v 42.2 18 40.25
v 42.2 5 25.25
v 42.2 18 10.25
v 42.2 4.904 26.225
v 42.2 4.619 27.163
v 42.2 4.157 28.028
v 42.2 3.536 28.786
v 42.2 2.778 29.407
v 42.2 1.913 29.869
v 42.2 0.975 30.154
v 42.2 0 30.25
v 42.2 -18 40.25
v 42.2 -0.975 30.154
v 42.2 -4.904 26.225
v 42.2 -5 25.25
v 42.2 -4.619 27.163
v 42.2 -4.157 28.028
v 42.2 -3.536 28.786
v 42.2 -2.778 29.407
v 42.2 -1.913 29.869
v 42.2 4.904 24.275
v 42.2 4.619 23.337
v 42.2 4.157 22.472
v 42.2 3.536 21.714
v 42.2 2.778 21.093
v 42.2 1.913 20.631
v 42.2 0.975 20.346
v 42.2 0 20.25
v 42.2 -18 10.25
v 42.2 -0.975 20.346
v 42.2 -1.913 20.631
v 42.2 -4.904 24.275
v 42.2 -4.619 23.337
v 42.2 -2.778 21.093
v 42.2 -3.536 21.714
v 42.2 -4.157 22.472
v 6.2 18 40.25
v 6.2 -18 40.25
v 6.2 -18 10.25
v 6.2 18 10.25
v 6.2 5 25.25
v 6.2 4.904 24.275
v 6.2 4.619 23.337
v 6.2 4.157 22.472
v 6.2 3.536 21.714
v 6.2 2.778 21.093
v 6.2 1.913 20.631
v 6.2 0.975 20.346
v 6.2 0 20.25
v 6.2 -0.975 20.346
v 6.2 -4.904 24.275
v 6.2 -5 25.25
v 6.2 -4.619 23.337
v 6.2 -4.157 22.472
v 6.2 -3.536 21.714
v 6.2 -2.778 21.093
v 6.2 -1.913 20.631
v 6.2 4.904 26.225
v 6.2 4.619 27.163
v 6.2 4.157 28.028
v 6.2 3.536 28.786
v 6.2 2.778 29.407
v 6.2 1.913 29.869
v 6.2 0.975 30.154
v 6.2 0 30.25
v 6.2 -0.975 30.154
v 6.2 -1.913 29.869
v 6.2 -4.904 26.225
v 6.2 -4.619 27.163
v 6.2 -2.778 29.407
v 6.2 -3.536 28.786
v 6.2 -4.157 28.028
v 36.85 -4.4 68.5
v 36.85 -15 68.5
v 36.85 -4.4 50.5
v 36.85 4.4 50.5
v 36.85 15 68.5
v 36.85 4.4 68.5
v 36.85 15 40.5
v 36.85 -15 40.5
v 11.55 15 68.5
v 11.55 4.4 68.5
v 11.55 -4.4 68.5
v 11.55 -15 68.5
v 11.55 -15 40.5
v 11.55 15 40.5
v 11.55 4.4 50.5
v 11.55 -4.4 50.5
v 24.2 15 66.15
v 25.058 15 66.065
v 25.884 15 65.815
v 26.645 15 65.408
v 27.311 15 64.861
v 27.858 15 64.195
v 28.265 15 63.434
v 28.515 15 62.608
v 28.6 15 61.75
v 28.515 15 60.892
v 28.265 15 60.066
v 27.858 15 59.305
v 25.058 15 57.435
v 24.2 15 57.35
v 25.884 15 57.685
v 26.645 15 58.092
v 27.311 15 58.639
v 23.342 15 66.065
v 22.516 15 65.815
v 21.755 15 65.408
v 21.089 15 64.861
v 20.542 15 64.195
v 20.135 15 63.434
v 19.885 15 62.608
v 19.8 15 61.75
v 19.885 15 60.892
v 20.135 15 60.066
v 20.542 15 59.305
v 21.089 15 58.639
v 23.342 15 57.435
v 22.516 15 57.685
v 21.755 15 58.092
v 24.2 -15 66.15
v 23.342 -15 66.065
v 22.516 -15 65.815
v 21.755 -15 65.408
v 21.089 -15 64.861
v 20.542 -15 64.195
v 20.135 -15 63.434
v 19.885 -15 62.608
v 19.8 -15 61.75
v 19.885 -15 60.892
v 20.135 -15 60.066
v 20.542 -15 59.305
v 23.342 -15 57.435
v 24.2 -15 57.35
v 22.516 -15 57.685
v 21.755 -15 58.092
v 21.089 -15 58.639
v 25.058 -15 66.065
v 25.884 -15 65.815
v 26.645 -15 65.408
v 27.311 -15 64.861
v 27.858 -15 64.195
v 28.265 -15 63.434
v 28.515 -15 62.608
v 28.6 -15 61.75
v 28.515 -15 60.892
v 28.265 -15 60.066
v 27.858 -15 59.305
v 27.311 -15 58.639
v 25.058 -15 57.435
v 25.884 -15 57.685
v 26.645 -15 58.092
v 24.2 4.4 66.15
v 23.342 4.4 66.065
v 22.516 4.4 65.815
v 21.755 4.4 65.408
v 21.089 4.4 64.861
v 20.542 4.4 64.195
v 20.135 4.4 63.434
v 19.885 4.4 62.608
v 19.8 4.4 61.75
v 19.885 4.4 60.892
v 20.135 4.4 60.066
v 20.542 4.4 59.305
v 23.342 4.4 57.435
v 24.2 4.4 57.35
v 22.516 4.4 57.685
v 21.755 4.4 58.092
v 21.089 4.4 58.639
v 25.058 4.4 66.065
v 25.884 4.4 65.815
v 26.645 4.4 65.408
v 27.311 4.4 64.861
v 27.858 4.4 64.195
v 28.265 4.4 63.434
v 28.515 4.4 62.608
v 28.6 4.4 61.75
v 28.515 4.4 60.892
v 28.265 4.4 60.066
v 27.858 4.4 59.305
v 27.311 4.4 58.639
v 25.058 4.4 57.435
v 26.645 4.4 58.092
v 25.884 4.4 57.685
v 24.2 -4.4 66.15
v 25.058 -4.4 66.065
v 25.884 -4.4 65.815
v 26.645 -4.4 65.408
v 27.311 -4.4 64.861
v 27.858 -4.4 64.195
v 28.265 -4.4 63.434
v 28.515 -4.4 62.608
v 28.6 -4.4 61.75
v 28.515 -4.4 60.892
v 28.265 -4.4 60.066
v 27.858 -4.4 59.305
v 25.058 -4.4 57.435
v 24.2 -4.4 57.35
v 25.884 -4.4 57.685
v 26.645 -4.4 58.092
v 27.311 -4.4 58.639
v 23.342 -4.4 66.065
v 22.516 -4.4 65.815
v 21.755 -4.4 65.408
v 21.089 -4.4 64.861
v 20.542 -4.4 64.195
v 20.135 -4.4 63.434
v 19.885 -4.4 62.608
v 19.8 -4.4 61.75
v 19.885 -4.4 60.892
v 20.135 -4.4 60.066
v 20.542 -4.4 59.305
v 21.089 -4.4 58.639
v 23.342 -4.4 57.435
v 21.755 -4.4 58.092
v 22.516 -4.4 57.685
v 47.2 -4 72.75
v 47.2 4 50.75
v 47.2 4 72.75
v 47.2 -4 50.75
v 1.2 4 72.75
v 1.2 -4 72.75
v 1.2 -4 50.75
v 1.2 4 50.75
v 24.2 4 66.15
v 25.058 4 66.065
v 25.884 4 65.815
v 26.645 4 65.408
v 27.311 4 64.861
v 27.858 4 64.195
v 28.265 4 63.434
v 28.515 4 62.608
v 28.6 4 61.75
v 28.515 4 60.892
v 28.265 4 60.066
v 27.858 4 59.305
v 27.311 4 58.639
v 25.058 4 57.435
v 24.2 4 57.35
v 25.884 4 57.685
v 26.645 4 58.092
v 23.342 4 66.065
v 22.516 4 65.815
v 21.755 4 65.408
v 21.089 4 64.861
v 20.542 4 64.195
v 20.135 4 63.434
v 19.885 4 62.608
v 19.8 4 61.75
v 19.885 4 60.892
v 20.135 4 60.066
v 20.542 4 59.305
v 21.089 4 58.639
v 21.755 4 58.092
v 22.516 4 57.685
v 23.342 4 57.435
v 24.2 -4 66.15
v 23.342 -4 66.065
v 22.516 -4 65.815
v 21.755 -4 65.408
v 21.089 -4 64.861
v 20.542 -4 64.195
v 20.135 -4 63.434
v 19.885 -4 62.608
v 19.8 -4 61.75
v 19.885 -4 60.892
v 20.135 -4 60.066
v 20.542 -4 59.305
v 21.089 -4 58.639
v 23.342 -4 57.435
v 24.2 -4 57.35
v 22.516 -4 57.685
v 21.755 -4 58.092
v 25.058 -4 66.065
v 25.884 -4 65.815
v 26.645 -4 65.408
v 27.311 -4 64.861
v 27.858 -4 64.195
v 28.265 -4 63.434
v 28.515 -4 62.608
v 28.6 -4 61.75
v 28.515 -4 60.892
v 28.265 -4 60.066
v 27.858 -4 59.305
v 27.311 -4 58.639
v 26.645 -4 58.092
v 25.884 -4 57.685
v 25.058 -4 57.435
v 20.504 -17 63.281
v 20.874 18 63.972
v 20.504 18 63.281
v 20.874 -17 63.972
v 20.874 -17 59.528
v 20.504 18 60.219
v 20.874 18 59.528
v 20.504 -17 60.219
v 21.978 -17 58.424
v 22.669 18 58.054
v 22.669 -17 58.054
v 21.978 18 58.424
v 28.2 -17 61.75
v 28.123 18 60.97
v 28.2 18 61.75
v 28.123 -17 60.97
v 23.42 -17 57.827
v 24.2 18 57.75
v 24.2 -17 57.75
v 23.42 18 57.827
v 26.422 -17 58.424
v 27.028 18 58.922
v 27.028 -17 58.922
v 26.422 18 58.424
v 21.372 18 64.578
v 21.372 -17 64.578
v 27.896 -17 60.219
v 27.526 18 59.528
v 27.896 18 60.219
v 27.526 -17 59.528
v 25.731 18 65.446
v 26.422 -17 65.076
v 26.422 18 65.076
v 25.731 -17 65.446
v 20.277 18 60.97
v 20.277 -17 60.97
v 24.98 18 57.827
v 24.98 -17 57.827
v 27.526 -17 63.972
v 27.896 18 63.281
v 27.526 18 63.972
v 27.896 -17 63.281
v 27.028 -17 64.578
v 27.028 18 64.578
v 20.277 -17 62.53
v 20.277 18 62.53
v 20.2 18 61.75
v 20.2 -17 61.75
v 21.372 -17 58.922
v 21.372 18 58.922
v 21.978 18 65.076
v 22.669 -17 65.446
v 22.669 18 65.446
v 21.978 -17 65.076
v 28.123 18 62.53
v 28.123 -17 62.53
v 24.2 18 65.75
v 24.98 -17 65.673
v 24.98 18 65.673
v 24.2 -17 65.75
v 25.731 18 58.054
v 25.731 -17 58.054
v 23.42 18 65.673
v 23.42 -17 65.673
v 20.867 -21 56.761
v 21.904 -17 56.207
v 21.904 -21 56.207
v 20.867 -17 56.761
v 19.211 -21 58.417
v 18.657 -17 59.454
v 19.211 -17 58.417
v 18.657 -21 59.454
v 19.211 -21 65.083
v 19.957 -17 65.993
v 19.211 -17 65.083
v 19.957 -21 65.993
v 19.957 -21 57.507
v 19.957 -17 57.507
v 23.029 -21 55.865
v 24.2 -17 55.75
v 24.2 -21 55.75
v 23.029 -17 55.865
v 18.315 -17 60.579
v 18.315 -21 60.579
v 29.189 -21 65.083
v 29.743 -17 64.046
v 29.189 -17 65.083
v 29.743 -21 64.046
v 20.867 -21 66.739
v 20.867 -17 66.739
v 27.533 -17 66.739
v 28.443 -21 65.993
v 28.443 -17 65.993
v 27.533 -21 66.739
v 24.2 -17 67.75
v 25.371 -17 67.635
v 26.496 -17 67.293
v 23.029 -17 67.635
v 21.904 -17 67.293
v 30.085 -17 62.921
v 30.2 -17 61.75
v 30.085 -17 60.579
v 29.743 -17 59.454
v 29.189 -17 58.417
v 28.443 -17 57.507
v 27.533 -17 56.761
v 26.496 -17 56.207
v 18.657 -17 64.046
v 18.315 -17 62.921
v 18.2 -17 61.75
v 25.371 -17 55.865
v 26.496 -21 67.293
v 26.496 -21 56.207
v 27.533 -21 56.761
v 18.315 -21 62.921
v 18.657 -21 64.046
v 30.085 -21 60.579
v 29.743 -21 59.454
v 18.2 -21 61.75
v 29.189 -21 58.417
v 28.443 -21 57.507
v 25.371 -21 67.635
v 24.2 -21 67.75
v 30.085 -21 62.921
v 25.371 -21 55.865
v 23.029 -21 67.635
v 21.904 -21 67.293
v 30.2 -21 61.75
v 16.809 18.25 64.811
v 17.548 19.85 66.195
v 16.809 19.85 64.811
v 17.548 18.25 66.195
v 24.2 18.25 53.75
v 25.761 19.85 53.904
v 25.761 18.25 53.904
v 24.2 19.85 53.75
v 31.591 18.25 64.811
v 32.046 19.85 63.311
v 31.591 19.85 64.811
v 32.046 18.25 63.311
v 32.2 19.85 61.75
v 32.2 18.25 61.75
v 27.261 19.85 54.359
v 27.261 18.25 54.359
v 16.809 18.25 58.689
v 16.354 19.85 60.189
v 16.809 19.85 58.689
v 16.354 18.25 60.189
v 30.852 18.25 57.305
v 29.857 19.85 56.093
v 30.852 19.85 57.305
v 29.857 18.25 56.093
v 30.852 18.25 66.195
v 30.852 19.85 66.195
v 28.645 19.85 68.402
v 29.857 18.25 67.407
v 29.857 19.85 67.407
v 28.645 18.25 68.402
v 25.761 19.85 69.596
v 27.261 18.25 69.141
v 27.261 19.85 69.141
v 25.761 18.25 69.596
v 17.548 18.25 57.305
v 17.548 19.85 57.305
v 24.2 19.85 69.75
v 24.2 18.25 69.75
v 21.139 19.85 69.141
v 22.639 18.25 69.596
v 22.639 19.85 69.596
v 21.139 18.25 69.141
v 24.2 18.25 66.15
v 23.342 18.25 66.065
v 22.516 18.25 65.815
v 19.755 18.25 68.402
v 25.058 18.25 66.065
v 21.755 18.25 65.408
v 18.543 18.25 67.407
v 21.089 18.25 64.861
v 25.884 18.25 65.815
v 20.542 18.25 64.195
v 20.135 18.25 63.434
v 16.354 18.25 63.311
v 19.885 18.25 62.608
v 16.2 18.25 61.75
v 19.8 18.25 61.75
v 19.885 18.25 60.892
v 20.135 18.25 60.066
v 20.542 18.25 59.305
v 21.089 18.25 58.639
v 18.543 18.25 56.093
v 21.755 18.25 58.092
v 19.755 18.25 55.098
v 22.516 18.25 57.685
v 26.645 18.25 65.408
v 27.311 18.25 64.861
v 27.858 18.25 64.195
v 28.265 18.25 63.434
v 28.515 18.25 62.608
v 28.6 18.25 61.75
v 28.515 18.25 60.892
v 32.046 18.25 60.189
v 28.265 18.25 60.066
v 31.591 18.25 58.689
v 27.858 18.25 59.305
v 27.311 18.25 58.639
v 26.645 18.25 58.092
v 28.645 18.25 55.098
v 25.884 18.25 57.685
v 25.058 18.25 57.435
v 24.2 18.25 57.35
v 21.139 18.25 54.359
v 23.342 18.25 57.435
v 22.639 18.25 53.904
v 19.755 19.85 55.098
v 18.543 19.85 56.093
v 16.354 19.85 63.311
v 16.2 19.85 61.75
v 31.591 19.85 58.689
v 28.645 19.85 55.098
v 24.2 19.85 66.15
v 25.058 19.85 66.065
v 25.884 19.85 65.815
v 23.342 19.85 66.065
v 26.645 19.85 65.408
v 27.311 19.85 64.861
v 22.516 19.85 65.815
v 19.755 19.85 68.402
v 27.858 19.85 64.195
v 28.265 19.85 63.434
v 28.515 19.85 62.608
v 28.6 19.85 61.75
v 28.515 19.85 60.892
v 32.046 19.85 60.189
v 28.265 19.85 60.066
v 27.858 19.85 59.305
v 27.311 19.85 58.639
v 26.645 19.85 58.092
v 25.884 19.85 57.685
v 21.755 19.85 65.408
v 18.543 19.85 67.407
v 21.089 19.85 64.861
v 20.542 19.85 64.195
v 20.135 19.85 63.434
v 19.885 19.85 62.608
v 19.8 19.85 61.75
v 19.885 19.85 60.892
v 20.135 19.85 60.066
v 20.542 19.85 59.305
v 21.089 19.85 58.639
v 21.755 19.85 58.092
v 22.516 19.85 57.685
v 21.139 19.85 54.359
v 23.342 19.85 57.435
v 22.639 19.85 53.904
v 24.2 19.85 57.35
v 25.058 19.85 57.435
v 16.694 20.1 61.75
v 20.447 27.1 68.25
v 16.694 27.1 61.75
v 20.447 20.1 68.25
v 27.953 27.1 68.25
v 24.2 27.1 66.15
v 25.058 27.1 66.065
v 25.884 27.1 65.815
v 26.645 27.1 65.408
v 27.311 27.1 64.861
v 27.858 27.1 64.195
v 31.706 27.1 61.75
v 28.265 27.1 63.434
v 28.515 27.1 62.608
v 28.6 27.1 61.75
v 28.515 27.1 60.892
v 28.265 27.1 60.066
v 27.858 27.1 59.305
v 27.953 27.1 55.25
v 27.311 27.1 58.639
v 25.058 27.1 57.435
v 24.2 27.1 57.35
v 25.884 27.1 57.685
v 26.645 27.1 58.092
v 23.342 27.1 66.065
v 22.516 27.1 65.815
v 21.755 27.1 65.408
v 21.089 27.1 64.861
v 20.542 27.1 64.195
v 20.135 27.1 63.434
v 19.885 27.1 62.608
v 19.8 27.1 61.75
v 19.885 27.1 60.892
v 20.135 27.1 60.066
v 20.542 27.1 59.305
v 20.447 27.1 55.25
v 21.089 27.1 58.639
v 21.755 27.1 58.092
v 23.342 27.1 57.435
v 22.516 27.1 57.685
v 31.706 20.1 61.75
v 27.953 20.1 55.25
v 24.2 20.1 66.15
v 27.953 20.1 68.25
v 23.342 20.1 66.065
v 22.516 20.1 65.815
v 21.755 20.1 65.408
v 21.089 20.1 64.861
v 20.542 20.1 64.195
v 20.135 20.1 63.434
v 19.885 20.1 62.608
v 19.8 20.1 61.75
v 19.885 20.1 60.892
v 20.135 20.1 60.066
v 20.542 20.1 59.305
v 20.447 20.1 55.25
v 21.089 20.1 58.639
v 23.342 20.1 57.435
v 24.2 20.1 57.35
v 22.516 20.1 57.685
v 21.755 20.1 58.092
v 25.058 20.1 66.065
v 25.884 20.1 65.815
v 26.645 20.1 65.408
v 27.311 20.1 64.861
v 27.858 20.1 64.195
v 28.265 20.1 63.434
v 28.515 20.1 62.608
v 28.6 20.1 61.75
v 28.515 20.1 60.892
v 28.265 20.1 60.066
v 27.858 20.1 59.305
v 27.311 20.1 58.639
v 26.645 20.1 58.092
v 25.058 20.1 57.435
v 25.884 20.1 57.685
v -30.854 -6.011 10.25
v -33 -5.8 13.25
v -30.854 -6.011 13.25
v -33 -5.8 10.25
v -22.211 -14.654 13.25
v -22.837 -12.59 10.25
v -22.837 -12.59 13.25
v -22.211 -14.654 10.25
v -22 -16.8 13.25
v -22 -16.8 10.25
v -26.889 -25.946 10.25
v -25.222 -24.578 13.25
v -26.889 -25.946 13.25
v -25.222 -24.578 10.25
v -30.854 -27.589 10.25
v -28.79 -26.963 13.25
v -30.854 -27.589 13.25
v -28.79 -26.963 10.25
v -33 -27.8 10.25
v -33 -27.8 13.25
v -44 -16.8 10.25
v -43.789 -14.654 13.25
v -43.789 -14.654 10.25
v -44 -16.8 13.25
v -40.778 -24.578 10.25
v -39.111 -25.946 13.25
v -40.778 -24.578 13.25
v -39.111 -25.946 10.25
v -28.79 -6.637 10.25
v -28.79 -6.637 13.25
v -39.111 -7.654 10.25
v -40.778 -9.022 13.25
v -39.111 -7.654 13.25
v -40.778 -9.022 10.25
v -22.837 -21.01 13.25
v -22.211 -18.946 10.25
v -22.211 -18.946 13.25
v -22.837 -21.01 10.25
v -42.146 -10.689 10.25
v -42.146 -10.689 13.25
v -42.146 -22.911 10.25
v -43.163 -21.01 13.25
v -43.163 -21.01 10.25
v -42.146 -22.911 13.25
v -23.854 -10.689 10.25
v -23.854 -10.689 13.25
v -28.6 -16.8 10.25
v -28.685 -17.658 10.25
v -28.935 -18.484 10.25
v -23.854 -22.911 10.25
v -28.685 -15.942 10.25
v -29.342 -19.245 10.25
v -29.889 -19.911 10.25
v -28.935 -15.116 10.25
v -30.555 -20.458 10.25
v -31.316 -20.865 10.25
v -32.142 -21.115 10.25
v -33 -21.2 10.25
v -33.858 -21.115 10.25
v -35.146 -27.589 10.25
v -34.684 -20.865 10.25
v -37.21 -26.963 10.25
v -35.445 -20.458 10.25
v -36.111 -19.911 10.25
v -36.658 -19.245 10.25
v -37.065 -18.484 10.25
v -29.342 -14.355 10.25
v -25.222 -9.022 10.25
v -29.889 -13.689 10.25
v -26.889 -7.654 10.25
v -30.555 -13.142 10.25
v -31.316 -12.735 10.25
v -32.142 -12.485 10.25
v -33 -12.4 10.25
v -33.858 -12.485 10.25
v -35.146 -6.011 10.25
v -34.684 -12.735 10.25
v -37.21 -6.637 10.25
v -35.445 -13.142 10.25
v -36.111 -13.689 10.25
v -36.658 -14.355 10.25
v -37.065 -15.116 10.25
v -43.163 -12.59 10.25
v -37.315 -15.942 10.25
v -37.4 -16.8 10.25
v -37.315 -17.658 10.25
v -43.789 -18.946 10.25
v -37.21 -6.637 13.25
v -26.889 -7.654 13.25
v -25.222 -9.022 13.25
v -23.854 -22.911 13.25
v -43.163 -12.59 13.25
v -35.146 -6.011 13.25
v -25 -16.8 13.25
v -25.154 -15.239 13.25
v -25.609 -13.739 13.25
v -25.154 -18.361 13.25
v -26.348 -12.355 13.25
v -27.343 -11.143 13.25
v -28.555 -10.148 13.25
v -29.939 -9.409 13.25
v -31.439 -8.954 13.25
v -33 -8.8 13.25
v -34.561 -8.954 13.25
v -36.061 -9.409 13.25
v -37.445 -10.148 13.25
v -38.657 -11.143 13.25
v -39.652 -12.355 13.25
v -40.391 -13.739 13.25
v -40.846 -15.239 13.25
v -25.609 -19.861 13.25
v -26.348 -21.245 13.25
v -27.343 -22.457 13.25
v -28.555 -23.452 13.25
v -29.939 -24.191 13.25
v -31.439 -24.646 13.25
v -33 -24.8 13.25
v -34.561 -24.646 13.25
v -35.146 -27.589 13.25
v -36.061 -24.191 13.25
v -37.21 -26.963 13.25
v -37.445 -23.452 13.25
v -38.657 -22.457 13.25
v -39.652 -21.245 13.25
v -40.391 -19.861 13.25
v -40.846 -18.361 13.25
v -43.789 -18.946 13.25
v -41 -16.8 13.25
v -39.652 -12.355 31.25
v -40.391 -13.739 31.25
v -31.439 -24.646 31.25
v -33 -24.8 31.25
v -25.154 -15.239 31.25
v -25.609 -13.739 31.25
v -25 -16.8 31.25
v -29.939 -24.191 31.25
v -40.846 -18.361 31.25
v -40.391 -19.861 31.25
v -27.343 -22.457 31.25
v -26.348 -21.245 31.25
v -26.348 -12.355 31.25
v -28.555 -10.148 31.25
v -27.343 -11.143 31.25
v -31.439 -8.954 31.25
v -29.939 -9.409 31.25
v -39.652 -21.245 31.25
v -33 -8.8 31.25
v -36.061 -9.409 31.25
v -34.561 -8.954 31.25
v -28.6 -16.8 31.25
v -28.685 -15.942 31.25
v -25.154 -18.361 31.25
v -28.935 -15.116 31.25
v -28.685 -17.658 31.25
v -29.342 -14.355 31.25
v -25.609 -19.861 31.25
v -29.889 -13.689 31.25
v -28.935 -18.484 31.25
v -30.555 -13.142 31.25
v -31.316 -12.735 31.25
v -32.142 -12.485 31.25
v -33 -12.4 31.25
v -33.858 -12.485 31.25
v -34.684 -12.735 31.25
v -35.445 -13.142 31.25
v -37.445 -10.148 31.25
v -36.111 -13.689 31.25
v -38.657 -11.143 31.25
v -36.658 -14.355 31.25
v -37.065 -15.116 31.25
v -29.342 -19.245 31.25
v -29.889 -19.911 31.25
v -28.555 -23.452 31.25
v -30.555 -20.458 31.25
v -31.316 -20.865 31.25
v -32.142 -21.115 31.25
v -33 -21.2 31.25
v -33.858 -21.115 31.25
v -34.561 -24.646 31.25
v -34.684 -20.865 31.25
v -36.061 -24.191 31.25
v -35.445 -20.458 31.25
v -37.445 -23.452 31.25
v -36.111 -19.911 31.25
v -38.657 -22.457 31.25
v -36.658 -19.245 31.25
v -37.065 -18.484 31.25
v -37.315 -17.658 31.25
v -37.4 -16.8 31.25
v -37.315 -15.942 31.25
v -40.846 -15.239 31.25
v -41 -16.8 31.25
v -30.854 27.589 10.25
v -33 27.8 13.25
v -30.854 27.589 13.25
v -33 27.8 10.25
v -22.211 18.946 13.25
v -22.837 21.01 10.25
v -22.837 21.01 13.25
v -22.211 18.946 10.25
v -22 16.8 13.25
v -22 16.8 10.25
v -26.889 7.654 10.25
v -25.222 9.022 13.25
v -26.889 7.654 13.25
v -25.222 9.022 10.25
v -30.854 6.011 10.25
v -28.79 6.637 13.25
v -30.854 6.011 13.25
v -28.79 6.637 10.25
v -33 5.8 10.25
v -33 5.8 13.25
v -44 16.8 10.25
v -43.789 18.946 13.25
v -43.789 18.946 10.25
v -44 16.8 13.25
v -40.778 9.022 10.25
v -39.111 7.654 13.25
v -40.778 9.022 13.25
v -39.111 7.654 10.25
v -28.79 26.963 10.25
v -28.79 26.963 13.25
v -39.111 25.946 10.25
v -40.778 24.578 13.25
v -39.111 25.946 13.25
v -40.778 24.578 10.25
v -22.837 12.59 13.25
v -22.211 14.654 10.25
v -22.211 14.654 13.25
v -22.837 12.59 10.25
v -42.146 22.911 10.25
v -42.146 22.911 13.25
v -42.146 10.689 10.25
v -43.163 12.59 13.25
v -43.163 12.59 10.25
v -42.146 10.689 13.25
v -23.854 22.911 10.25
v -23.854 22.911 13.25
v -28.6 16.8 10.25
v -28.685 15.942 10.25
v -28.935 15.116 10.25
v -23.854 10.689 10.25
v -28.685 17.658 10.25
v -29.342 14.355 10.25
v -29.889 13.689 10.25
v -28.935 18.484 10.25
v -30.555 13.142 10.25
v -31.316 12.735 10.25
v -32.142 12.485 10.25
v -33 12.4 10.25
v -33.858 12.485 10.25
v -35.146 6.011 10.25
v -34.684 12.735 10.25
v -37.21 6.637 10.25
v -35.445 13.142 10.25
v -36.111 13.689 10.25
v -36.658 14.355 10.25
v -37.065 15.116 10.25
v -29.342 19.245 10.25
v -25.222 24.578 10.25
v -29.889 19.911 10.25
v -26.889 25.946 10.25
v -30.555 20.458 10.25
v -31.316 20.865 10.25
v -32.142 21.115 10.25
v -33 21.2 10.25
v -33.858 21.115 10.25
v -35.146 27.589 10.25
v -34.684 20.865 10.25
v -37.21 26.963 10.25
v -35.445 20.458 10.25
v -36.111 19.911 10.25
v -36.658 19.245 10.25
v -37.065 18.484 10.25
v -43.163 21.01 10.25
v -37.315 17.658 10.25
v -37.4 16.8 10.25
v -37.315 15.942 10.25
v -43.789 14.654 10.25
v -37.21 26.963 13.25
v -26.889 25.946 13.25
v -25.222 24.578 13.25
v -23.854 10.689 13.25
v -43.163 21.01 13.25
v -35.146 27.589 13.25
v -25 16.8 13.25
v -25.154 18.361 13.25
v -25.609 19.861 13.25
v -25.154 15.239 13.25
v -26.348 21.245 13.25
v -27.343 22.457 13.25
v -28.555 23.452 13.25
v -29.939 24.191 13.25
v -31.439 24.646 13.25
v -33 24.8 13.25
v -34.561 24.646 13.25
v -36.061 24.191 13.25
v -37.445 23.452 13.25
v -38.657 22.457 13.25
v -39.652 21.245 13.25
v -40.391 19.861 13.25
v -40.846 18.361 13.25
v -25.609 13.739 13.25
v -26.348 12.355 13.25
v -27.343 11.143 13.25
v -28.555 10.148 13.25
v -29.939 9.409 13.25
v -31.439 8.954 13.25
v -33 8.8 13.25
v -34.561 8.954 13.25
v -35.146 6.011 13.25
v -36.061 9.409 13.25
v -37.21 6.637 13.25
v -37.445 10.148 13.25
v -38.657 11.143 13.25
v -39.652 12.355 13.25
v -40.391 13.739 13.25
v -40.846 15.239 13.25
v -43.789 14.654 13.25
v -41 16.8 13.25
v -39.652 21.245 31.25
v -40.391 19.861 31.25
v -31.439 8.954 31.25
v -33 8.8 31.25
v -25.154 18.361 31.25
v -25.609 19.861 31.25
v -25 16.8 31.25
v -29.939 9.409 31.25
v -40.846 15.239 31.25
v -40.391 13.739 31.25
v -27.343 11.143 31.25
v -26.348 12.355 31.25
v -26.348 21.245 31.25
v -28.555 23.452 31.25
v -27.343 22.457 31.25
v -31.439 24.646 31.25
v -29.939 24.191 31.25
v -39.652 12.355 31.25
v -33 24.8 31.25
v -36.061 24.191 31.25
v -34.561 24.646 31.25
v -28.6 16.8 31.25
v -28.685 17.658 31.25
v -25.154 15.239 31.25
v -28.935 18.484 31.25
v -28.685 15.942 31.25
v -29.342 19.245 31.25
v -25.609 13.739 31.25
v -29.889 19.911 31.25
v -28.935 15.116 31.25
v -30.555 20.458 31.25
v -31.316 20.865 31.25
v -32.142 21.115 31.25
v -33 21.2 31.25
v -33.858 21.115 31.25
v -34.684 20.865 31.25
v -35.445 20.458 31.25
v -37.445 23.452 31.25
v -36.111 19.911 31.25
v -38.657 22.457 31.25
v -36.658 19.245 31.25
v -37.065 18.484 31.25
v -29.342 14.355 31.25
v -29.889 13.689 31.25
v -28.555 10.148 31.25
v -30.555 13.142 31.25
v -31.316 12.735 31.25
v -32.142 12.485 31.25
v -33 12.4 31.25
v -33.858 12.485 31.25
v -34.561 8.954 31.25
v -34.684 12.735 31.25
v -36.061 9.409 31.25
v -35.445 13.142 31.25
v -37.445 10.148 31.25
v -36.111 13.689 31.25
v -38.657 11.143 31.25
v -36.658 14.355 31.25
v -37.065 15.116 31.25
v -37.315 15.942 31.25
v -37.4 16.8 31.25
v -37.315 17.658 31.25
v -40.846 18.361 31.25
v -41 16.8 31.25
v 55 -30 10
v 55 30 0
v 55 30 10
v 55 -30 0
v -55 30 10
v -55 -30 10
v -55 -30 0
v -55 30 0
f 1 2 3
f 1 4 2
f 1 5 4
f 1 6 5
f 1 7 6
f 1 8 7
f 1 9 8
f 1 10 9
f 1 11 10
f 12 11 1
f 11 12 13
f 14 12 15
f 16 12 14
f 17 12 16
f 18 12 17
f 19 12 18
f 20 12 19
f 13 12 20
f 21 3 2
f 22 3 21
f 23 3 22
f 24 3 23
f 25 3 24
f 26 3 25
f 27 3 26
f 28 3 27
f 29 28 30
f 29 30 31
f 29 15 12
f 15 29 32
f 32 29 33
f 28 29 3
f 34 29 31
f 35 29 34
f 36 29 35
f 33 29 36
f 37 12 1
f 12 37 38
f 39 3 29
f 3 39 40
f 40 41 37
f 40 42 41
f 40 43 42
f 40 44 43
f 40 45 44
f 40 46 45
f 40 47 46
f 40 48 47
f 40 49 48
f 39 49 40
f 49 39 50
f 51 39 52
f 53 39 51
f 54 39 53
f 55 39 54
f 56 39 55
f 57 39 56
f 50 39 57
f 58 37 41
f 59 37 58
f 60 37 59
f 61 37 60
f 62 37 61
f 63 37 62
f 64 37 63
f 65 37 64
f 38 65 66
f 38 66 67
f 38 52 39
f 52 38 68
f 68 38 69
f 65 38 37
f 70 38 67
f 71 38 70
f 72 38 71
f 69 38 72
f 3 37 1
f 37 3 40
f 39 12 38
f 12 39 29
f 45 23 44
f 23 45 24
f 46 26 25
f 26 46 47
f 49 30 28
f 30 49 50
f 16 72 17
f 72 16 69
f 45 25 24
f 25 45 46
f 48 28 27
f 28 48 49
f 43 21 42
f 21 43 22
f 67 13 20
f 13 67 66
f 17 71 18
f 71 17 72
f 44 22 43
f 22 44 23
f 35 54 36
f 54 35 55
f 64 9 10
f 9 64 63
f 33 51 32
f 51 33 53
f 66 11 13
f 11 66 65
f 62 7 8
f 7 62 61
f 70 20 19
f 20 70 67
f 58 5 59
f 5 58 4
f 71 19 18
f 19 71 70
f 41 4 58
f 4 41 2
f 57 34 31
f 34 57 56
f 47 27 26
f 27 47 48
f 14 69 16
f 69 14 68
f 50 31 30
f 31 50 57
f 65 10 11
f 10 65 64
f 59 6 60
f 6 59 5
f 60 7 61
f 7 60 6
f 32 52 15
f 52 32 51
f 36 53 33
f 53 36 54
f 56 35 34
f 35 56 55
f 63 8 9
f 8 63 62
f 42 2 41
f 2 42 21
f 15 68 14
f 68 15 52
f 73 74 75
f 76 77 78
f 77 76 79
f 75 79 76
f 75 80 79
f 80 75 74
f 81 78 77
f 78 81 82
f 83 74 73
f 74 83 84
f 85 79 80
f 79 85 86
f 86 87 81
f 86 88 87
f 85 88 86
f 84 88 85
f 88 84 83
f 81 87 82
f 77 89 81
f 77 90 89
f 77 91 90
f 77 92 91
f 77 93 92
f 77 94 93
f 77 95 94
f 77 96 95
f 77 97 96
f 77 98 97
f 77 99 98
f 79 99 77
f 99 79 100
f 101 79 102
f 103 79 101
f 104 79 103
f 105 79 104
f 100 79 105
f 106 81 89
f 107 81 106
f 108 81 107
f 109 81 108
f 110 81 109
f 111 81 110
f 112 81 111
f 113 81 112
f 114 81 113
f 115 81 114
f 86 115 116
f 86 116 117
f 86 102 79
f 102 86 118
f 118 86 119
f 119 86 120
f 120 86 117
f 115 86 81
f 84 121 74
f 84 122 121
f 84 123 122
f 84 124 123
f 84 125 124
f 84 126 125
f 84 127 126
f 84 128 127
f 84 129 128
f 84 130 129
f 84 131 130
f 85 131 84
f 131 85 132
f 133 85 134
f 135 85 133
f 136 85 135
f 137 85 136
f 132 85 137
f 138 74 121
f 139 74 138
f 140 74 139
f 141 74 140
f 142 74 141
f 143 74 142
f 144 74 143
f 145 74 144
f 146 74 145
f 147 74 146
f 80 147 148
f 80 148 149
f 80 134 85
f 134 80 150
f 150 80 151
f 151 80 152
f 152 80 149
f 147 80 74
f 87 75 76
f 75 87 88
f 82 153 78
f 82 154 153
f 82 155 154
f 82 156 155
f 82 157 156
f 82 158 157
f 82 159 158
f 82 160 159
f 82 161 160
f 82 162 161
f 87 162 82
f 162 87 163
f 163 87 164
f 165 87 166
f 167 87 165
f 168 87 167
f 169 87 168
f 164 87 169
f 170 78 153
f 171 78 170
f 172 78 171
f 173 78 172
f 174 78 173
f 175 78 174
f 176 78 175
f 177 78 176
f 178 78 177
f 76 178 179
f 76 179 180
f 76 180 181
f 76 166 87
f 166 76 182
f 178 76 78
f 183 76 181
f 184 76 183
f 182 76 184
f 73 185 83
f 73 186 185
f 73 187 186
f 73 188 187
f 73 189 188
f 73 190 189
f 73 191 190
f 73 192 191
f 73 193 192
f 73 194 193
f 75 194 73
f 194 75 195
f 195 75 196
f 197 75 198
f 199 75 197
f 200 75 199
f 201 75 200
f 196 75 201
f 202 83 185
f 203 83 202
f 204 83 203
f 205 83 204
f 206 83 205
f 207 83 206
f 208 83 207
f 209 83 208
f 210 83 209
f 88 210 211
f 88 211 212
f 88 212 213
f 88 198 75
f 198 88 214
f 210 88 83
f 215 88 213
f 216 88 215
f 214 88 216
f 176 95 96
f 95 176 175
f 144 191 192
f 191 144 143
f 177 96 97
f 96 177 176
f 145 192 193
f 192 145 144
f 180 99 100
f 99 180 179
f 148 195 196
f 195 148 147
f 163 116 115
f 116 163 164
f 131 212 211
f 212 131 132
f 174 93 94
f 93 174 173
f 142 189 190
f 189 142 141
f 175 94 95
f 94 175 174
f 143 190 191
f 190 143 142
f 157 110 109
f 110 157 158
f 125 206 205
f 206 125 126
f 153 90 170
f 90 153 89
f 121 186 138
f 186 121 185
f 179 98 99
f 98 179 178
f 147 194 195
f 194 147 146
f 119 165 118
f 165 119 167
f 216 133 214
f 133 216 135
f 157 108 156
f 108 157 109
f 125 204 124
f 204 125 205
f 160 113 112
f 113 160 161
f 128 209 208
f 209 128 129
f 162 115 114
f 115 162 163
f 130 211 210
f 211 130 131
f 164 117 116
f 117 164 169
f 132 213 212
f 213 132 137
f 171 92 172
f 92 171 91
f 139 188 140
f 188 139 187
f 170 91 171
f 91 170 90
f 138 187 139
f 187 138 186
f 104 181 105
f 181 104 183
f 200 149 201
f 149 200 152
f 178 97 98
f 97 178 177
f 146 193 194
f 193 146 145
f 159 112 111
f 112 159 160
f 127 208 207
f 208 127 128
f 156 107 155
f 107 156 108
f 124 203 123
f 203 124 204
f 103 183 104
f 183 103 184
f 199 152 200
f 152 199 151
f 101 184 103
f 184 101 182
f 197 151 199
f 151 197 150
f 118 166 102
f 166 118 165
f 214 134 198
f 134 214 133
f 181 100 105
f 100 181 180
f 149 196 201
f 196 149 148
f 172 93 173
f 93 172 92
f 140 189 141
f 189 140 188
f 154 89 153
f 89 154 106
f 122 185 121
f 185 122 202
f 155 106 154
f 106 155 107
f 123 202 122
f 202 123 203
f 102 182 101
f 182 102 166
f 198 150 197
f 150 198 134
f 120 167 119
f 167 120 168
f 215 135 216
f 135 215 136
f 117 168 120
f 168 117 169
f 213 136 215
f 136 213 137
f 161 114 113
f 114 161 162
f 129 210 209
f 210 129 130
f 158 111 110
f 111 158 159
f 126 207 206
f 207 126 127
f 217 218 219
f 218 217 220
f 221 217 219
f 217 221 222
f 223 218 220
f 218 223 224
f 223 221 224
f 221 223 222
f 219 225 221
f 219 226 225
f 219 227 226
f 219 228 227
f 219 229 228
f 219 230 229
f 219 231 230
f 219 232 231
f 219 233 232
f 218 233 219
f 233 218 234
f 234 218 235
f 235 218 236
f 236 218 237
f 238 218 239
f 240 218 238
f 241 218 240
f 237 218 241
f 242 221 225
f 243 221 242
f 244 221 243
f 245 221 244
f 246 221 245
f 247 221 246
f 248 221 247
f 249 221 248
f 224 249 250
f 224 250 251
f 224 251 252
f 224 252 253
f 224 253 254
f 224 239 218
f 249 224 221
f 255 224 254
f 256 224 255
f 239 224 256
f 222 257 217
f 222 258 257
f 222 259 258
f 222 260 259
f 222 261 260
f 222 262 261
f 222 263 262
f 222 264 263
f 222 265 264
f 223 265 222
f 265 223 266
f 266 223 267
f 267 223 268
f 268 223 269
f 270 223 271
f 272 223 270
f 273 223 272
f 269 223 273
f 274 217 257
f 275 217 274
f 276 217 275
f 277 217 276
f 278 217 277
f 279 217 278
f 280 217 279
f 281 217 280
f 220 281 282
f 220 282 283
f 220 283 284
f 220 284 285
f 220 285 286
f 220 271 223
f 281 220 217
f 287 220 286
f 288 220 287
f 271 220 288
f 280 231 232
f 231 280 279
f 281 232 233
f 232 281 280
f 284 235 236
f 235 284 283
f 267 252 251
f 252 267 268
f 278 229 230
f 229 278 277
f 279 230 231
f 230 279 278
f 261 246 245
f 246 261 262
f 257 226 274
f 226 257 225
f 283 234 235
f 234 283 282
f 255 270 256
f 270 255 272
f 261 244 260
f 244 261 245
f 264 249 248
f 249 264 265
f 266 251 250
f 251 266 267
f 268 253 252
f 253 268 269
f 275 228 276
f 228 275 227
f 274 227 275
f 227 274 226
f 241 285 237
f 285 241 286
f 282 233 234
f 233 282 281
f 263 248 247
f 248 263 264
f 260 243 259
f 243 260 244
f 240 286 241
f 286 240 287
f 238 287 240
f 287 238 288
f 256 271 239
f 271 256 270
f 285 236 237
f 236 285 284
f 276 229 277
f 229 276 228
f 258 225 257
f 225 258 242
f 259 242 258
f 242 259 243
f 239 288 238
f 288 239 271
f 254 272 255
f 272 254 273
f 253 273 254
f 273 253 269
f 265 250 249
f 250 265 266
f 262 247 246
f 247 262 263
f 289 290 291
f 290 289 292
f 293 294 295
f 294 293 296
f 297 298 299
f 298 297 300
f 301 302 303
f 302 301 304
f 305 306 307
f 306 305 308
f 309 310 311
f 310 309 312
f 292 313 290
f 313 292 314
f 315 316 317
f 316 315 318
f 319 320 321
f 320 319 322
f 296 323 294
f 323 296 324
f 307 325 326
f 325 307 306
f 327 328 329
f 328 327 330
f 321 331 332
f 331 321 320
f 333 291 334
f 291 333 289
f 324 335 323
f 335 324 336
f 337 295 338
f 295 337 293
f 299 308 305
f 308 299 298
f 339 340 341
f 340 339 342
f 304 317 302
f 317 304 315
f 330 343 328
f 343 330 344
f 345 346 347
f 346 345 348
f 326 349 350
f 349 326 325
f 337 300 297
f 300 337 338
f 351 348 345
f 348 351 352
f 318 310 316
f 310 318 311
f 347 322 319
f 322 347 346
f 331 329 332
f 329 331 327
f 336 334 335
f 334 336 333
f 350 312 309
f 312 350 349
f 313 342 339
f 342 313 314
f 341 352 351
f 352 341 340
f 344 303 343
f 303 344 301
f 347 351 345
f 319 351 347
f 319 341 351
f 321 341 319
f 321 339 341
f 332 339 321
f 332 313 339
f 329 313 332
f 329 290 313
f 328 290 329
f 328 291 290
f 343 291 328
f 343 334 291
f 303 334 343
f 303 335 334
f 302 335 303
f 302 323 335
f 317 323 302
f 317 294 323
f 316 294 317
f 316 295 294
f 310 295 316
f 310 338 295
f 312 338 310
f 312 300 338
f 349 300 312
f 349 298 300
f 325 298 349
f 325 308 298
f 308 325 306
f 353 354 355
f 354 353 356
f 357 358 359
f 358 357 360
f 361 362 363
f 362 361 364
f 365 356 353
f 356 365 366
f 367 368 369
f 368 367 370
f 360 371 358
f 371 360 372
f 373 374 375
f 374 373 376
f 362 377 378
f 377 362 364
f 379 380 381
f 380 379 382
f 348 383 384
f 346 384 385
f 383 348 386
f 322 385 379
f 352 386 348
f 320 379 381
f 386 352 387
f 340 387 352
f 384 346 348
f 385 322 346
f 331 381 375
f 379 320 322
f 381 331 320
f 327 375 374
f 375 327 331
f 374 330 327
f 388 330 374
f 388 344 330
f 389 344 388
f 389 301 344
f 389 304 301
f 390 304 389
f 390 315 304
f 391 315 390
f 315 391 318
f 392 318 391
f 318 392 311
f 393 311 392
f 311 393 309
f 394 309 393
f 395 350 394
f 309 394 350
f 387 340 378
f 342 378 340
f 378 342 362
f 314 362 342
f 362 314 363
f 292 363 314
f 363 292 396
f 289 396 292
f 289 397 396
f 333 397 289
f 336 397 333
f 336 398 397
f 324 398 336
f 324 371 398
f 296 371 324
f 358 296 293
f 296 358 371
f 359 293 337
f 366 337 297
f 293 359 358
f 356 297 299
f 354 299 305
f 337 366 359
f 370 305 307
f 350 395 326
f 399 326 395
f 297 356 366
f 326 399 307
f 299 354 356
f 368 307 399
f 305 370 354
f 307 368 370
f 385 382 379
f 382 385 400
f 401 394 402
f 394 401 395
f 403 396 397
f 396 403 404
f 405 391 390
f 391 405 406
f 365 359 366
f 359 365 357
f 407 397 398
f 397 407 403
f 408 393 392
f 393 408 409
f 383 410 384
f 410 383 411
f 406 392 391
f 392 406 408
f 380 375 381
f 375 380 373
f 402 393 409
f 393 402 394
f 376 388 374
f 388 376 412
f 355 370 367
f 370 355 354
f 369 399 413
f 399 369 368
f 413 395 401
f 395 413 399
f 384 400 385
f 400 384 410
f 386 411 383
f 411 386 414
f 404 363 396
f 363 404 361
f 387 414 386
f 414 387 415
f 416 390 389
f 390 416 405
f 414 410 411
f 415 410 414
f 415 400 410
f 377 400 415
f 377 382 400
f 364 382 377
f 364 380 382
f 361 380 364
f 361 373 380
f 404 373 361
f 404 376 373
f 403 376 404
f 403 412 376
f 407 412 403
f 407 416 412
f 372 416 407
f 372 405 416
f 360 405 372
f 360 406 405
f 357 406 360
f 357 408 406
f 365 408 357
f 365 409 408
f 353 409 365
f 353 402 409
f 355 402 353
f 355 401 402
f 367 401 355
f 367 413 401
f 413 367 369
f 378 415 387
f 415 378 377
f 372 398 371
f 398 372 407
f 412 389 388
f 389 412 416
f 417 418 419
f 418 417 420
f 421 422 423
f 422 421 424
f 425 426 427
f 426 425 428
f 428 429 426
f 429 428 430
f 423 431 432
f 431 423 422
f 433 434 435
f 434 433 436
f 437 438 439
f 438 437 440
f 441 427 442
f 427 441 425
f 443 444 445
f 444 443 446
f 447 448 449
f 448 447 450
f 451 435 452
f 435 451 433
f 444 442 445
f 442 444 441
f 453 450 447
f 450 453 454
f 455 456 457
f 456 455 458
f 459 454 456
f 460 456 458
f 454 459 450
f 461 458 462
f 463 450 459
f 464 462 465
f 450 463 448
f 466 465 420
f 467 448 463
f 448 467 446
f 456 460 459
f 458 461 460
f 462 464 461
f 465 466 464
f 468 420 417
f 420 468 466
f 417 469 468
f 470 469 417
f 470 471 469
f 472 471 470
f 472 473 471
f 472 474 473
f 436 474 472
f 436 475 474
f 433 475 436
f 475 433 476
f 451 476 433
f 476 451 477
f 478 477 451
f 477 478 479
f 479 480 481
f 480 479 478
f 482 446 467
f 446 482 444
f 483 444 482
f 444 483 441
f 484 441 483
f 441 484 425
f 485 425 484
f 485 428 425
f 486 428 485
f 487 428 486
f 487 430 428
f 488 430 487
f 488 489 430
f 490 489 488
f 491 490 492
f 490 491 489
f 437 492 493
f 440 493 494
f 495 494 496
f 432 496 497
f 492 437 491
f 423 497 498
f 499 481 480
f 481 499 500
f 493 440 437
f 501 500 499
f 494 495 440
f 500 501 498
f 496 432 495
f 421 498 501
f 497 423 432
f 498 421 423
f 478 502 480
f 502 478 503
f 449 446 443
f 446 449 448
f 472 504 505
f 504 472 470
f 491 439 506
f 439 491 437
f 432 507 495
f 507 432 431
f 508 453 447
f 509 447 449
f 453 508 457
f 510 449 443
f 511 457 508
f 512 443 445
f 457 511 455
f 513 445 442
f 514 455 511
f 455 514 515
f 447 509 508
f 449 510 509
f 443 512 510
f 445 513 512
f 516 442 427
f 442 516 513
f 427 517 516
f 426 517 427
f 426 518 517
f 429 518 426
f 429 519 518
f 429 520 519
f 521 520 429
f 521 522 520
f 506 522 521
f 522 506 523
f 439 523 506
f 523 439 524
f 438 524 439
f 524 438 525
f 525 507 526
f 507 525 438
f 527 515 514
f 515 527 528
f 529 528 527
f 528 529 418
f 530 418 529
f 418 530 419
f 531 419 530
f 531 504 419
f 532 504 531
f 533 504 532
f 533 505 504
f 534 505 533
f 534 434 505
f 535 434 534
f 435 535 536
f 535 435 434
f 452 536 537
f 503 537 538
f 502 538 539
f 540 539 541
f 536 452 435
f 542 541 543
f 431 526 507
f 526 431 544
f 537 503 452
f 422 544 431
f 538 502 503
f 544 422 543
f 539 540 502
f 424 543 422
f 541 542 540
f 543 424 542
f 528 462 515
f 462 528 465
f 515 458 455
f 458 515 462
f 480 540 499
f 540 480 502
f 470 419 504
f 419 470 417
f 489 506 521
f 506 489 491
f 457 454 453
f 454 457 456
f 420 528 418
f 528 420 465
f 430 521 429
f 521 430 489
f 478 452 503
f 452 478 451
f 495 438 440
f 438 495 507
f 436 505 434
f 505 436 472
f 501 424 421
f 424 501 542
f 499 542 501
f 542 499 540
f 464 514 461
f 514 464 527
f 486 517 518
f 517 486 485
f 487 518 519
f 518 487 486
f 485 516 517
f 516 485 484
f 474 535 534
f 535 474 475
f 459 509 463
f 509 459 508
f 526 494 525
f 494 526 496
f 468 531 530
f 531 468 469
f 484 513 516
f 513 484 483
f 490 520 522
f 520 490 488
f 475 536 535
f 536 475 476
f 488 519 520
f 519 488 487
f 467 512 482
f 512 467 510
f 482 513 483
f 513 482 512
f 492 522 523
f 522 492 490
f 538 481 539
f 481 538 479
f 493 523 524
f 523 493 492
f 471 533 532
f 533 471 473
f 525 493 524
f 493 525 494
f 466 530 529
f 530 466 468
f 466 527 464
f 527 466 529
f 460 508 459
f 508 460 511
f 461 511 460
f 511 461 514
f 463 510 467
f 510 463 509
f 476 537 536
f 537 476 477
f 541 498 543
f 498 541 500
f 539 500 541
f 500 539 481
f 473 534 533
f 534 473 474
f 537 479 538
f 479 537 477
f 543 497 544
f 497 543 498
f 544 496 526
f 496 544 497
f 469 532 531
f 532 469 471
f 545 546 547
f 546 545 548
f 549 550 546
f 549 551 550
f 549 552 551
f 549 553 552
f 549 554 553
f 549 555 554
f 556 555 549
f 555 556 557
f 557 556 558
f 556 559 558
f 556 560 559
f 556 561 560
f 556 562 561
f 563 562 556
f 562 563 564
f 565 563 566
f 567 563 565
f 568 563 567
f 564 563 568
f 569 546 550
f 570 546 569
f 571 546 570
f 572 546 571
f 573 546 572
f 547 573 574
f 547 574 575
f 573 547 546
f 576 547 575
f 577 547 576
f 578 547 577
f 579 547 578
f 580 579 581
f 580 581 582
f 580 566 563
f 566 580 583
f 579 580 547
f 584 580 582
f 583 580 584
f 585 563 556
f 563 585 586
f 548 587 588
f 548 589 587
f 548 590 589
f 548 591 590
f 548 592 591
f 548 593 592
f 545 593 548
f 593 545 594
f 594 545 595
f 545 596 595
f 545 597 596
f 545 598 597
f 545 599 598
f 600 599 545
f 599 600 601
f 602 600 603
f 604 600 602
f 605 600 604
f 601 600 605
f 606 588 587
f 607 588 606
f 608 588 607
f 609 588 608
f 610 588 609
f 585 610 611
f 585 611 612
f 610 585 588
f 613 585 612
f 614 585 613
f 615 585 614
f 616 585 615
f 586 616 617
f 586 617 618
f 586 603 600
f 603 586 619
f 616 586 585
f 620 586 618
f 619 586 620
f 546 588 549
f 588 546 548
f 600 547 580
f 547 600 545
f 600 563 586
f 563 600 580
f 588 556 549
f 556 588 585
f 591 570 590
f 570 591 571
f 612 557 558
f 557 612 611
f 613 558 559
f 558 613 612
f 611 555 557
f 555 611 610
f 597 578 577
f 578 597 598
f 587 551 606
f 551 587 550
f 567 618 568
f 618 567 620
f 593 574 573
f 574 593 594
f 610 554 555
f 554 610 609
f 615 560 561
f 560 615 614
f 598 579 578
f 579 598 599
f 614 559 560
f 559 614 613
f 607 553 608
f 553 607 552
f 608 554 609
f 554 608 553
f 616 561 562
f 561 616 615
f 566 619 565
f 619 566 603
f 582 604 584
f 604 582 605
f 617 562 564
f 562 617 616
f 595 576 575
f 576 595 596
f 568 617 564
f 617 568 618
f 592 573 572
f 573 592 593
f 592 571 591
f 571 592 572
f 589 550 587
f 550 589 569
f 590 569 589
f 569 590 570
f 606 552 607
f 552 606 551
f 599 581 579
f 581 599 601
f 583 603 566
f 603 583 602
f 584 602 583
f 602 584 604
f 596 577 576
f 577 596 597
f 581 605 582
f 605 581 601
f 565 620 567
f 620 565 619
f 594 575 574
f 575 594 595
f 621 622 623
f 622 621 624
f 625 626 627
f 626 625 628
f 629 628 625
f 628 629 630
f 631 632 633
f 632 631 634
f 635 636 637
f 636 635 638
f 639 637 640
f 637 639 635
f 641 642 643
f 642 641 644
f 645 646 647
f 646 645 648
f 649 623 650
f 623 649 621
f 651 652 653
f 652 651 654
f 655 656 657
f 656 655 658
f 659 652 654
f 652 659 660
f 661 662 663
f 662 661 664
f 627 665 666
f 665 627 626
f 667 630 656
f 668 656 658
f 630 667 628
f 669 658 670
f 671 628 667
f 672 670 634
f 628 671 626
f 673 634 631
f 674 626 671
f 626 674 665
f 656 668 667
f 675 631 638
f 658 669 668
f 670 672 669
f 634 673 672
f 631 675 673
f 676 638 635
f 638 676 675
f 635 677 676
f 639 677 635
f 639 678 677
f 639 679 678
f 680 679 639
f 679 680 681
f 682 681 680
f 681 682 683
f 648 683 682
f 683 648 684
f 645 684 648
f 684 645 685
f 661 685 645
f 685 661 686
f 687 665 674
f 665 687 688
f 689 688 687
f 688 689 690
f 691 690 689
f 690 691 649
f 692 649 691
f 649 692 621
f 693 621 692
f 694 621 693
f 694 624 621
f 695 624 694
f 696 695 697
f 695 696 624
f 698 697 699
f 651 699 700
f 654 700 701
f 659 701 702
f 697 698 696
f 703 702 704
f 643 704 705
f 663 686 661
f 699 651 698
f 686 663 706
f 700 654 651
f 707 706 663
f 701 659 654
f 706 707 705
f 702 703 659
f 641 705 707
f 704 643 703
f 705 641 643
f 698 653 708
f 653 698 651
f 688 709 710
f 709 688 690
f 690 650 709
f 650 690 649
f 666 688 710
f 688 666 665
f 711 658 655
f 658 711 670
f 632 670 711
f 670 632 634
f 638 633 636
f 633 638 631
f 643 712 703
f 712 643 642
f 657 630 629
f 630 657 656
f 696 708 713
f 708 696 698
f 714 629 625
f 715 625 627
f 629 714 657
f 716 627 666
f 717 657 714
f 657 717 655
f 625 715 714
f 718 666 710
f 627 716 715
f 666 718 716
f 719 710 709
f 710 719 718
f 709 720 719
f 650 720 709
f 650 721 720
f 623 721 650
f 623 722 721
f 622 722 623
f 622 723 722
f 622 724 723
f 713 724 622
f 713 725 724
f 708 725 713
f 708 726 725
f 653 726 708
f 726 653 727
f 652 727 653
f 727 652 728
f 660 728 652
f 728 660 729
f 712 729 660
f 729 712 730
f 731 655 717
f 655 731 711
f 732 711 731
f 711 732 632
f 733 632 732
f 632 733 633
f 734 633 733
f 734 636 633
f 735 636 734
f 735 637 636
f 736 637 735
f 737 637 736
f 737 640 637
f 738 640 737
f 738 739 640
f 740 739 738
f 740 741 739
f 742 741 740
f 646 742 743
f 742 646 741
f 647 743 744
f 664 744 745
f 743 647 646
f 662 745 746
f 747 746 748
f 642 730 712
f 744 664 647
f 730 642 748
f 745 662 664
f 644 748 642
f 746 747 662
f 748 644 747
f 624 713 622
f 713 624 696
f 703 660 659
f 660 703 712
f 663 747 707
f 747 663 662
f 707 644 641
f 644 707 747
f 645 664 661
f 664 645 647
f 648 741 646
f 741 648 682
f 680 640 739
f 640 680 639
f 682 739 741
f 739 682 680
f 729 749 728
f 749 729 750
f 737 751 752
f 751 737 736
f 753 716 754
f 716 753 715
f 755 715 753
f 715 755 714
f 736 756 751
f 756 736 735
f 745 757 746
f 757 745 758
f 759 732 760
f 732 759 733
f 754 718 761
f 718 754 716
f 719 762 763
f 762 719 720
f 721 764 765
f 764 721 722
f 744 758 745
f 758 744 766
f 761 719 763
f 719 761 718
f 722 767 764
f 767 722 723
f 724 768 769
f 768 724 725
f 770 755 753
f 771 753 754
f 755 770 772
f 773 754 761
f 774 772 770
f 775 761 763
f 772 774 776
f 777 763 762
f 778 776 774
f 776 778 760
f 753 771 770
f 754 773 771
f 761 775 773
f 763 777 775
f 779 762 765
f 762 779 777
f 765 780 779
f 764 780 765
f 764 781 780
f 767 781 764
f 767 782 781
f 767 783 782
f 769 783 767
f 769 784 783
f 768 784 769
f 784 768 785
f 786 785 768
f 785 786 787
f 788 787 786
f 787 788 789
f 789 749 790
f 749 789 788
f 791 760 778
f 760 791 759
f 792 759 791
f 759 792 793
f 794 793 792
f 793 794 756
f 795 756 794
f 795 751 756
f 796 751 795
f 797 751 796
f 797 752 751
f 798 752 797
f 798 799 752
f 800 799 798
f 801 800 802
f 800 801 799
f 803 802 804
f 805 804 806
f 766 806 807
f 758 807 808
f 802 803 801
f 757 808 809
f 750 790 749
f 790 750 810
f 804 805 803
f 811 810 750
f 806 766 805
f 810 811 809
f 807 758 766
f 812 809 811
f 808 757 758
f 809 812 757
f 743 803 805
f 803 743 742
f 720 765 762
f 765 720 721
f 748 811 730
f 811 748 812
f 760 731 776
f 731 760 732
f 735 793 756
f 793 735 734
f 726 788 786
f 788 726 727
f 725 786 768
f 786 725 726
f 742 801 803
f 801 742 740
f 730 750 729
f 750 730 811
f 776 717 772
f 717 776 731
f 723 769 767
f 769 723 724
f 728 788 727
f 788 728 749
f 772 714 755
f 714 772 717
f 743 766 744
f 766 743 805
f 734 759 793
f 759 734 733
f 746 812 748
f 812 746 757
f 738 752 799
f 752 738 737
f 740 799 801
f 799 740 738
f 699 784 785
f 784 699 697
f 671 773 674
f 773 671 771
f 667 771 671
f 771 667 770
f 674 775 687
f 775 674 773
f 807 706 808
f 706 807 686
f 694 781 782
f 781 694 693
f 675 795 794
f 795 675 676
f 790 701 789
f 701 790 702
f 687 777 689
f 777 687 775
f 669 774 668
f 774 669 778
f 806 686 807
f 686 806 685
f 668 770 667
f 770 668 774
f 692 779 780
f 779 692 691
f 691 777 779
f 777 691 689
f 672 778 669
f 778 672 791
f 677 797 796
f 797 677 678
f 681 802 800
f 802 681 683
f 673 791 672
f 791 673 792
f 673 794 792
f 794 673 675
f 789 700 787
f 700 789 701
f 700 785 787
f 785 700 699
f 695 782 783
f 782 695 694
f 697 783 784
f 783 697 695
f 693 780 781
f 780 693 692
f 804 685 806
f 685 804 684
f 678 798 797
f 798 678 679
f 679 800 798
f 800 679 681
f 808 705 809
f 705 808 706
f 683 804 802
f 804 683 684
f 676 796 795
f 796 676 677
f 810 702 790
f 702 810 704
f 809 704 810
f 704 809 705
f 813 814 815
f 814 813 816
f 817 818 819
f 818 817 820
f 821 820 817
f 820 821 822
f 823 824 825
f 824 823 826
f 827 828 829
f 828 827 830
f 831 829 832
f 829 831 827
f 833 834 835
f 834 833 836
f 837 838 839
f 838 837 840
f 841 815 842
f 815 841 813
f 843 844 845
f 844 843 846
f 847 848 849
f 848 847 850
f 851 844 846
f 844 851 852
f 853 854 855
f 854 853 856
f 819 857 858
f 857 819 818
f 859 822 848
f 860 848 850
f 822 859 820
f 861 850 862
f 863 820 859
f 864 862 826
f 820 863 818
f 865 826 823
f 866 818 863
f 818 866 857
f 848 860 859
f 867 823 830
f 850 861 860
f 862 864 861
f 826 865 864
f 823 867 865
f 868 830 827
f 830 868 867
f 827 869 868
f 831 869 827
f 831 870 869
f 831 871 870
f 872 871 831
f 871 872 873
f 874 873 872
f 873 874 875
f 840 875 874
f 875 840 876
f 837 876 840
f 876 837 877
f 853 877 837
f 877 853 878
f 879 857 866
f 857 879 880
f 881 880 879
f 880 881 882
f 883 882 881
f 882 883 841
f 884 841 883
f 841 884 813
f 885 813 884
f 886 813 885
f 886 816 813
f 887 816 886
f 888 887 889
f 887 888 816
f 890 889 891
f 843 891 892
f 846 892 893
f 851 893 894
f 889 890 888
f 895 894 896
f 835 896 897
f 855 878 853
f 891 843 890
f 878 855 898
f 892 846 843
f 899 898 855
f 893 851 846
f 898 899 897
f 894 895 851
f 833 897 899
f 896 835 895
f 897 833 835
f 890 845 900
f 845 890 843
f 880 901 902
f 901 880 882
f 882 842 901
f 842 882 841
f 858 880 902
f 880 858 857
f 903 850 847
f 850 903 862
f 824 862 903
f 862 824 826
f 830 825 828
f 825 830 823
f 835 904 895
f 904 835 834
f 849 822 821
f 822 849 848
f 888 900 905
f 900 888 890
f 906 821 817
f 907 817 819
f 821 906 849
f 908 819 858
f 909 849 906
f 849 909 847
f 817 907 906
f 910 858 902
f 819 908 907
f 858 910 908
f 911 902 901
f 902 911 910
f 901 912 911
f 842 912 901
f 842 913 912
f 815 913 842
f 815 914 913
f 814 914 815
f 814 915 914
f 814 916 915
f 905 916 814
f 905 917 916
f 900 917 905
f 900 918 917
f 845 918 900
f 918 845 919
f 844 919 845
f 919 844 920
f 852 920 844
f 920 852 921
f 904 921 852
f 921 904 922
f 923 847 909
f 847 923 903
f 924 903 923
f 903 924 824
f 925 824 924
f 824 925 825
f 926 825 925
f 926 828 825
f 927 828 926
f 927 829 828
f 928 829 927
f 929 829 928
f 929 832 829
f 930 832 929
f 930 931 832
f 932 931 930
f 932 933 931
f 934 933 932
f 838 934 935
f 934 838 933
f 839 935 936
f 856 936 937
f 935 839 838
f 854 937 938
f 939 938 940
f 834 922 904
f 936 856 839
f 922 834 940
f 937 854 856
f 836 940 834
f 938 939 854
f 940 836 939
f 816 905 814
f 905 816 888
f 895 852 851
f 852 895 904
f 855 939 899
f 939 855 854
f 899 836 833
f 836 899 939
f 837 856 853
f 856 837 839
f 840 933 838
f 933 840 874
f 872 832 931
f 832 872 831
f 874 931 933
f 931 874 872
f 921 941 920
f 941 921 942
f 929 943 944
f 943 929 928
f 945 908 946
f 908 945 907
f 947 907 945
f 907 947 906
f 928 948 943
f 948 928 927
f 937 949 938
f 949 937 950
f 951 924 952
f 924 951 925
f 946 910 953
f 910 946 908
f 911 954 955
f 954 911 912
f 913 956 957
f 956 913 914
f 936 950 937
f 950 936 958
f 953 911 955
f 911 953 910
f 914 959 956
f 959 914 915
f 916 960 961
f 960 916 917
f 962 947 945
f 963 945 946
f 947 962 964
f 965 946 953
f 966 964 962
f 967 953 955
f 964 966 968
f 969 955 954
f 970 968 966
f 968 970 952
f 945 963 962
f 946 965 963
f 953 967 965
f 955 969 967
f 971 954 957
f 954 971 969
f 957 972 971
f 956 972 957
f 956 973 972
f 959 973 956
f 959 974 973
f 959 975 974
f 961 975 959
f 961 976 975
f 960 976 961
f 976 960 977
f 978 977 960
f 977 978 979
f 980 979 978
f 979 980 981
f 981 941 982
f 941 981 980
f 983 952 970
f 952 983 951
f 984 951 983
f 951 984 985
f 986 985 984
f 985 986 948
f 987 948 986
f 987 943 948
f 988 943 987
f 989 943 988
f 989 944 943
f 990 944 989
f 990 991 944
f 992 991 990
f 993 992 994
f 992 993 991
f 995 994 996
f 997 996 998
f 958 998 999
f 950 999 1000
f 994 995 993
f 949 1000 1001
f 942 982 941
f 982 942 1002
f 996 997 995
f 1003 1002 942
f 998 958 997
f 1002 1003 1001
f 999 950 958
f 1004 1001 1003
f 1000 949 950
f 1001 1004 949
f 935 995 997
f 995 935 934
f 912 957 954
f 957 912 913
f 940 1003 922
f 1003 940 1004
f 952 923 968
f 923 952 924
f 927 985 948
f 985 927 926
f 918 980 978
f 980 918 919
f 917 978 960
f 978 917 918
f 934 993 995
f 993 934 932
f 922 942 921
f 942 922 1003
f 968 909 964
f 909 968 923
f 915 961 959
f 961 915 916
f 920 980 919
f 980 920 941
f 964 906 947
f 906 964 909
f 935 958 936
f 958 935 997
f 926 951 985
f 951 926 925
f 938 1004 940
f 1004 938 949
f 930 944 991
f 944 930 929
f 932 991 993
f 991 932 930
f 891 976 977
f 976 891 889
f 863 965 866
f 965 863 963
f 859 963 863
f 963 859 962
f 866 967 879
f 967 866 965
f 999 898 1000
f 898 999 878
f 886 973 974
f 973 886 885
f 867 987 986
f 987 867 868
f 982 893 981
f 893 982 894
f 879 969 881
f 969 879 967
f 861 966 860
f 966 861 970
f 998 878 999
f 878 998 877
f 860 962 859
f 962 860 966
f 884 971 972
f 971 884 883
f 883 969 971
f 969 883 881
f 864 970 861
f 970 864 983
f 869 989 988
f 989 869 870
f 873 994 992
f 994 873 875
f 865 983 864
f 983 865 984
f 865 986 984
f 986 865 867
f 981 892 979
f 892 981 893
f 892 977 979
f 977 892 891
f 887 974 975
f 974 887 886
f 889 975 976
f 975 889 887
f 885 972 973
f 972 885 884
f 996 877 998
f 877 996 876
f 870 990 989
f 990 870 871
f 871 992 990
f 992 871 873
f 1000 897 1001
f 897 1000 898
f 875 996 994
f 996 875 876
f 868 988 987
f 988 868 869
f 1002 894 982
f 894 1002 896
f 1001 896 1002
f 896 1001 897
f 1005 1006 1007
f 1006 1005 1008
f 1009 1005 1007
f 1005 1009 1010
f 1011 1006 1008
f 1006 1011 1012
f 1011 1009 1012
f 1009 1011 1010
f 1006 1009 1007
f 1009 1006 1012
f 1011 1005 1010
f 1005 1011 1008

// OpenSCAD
$fn = 32;

// ------------------------------------------------------------------------
// Indexing jig: plate 110 x 60 mm, pin d8
// Every part is its own module, assembly() places every instance.
// ------------------------------------------------------------------------

// --- part 1 ---
module jig_plate() {
  difference() {
    translate([-55, -30, 0]) cube([110, 60, 10]);
  }
}

// --- part 2 ---
module locator_block() {
  difference() {
    translate([-18, -18, 0]) cube([36, 36, 30]);
    translate([0, 0, 15]) rotate([0, 90, 0]) cylinder(h = 38, d = 10, center = true);
  }
}

// --- part 3 ---
module index_fork() {
  difference() {
    translate([-12.65, -15, 0]) cube([25.3, 30, 28]);
    translate([-13.65, -4.4, 10]) cube([27.3, 8.8, 19]);
    translate([0, 0, 21.25]) rotate([90, 0, 0]) cylinder(h = 32, d = 8.8, center = true);
  }
}

// --- part 4 ---
module index_arm() {
  difference() {
    translate([-23, -4, 0]) cube([46, 8, 22]);
    translate([0, 0, 11]) rotate([90, 0, 0]) cylinder(h = 10, d = 8.8, center = true);
  }
}

// --- part 5 ---
module index_pin() {
  rotate([0, 90, 0]) cylinder(h = 36, d = 8, center = true);
  translate([-21, 0, 0]) rotate([0, 90, 0]) cylinder(h = 4, d = 12);
}

// --- part 6 ---
module pin_washer() {
  difference() {
      translate([0, 0, 0]) cylinder(h = 1.6, d = 16);
      translate([0, 0, -1]) cylinder(h = 3.6, d = 8.8);
    }
}

// --- part 7 ---
module lock_nut() {
  difference() {
    linear_extrude(height = 7) polygon(points = [[7.506, 0], [3.753, 6.5], [-3.753, 6.5], [-7.506, 0], [-3.753, -6.5], [3.753, -6.5]]);
    translate([0, 0, -1]) cylinder(h = 9, d = 8.8);
  }
}

// --- part 8 ---
module guide_bush_a() {
  difference() {
    union() {
      cylinder(h = 3, d = 22);
      translate([0, 0, 3]) cylinder(h = 18, d = 16);
    }
    translate([0, 0, -1]) cylinder(h = 23, d = 8.8);
  }
}

// --- part 9 ---
module guide_bush_b() {
  difference() {
    union() {
      cylinder(h = 3, d = 22);
      translate([0, 0, 3]) cylinder(h = 18, d = 16);
    }
    translate([0, 0, -1]) cylinder(h = 23, d = 8.8);
  }
}

// --- assembly ---
module assembly() {
  color([0.80, 0.24, 0.20]) translate([0, 0, 0]) rotate([0, 0, 0]) jig_plate();
  color([0.20, 0.45, 0.75]) translate([24.2, 0, 10.25]) rotate([0, 0, 0]) locator_block();
  color([0.25, 0.62, 0.32]) translate([24.2, 0, 40.5]) rotate([0, 0, 0]) index_fork();
  color([0.92, 0.70, 0.18]) translate([24.2, 0, 50.75]) rotate([0, 0, 0]) index_arm();
  color([0.58, 0.35, 0.70]) translate([24.2, 0, 61.75]) rotate([0, 0, 90]) index_pin();
  color([0.16, 0.66, 0.66]) translate([24.2, 19.85, 61.75]) rotate([90, 0, 0]) pin_washer();
  color([0.85, 0.48, 0.18]) translate([24.2, 27.1, 61.75]) rotate([90, 0, 0]) lock_nut();
  color([0.55, 0.60, 0.65]) translate([-33, -16.8, 10.25]) rotate([0, 0, 0]) guide_bush_a();
  color([0.75, 0.30, 0.55]) translate([-33, 16.8, 10.25]) rotate([0, 0, 0]) guide_bush_b();
}

assembly();
